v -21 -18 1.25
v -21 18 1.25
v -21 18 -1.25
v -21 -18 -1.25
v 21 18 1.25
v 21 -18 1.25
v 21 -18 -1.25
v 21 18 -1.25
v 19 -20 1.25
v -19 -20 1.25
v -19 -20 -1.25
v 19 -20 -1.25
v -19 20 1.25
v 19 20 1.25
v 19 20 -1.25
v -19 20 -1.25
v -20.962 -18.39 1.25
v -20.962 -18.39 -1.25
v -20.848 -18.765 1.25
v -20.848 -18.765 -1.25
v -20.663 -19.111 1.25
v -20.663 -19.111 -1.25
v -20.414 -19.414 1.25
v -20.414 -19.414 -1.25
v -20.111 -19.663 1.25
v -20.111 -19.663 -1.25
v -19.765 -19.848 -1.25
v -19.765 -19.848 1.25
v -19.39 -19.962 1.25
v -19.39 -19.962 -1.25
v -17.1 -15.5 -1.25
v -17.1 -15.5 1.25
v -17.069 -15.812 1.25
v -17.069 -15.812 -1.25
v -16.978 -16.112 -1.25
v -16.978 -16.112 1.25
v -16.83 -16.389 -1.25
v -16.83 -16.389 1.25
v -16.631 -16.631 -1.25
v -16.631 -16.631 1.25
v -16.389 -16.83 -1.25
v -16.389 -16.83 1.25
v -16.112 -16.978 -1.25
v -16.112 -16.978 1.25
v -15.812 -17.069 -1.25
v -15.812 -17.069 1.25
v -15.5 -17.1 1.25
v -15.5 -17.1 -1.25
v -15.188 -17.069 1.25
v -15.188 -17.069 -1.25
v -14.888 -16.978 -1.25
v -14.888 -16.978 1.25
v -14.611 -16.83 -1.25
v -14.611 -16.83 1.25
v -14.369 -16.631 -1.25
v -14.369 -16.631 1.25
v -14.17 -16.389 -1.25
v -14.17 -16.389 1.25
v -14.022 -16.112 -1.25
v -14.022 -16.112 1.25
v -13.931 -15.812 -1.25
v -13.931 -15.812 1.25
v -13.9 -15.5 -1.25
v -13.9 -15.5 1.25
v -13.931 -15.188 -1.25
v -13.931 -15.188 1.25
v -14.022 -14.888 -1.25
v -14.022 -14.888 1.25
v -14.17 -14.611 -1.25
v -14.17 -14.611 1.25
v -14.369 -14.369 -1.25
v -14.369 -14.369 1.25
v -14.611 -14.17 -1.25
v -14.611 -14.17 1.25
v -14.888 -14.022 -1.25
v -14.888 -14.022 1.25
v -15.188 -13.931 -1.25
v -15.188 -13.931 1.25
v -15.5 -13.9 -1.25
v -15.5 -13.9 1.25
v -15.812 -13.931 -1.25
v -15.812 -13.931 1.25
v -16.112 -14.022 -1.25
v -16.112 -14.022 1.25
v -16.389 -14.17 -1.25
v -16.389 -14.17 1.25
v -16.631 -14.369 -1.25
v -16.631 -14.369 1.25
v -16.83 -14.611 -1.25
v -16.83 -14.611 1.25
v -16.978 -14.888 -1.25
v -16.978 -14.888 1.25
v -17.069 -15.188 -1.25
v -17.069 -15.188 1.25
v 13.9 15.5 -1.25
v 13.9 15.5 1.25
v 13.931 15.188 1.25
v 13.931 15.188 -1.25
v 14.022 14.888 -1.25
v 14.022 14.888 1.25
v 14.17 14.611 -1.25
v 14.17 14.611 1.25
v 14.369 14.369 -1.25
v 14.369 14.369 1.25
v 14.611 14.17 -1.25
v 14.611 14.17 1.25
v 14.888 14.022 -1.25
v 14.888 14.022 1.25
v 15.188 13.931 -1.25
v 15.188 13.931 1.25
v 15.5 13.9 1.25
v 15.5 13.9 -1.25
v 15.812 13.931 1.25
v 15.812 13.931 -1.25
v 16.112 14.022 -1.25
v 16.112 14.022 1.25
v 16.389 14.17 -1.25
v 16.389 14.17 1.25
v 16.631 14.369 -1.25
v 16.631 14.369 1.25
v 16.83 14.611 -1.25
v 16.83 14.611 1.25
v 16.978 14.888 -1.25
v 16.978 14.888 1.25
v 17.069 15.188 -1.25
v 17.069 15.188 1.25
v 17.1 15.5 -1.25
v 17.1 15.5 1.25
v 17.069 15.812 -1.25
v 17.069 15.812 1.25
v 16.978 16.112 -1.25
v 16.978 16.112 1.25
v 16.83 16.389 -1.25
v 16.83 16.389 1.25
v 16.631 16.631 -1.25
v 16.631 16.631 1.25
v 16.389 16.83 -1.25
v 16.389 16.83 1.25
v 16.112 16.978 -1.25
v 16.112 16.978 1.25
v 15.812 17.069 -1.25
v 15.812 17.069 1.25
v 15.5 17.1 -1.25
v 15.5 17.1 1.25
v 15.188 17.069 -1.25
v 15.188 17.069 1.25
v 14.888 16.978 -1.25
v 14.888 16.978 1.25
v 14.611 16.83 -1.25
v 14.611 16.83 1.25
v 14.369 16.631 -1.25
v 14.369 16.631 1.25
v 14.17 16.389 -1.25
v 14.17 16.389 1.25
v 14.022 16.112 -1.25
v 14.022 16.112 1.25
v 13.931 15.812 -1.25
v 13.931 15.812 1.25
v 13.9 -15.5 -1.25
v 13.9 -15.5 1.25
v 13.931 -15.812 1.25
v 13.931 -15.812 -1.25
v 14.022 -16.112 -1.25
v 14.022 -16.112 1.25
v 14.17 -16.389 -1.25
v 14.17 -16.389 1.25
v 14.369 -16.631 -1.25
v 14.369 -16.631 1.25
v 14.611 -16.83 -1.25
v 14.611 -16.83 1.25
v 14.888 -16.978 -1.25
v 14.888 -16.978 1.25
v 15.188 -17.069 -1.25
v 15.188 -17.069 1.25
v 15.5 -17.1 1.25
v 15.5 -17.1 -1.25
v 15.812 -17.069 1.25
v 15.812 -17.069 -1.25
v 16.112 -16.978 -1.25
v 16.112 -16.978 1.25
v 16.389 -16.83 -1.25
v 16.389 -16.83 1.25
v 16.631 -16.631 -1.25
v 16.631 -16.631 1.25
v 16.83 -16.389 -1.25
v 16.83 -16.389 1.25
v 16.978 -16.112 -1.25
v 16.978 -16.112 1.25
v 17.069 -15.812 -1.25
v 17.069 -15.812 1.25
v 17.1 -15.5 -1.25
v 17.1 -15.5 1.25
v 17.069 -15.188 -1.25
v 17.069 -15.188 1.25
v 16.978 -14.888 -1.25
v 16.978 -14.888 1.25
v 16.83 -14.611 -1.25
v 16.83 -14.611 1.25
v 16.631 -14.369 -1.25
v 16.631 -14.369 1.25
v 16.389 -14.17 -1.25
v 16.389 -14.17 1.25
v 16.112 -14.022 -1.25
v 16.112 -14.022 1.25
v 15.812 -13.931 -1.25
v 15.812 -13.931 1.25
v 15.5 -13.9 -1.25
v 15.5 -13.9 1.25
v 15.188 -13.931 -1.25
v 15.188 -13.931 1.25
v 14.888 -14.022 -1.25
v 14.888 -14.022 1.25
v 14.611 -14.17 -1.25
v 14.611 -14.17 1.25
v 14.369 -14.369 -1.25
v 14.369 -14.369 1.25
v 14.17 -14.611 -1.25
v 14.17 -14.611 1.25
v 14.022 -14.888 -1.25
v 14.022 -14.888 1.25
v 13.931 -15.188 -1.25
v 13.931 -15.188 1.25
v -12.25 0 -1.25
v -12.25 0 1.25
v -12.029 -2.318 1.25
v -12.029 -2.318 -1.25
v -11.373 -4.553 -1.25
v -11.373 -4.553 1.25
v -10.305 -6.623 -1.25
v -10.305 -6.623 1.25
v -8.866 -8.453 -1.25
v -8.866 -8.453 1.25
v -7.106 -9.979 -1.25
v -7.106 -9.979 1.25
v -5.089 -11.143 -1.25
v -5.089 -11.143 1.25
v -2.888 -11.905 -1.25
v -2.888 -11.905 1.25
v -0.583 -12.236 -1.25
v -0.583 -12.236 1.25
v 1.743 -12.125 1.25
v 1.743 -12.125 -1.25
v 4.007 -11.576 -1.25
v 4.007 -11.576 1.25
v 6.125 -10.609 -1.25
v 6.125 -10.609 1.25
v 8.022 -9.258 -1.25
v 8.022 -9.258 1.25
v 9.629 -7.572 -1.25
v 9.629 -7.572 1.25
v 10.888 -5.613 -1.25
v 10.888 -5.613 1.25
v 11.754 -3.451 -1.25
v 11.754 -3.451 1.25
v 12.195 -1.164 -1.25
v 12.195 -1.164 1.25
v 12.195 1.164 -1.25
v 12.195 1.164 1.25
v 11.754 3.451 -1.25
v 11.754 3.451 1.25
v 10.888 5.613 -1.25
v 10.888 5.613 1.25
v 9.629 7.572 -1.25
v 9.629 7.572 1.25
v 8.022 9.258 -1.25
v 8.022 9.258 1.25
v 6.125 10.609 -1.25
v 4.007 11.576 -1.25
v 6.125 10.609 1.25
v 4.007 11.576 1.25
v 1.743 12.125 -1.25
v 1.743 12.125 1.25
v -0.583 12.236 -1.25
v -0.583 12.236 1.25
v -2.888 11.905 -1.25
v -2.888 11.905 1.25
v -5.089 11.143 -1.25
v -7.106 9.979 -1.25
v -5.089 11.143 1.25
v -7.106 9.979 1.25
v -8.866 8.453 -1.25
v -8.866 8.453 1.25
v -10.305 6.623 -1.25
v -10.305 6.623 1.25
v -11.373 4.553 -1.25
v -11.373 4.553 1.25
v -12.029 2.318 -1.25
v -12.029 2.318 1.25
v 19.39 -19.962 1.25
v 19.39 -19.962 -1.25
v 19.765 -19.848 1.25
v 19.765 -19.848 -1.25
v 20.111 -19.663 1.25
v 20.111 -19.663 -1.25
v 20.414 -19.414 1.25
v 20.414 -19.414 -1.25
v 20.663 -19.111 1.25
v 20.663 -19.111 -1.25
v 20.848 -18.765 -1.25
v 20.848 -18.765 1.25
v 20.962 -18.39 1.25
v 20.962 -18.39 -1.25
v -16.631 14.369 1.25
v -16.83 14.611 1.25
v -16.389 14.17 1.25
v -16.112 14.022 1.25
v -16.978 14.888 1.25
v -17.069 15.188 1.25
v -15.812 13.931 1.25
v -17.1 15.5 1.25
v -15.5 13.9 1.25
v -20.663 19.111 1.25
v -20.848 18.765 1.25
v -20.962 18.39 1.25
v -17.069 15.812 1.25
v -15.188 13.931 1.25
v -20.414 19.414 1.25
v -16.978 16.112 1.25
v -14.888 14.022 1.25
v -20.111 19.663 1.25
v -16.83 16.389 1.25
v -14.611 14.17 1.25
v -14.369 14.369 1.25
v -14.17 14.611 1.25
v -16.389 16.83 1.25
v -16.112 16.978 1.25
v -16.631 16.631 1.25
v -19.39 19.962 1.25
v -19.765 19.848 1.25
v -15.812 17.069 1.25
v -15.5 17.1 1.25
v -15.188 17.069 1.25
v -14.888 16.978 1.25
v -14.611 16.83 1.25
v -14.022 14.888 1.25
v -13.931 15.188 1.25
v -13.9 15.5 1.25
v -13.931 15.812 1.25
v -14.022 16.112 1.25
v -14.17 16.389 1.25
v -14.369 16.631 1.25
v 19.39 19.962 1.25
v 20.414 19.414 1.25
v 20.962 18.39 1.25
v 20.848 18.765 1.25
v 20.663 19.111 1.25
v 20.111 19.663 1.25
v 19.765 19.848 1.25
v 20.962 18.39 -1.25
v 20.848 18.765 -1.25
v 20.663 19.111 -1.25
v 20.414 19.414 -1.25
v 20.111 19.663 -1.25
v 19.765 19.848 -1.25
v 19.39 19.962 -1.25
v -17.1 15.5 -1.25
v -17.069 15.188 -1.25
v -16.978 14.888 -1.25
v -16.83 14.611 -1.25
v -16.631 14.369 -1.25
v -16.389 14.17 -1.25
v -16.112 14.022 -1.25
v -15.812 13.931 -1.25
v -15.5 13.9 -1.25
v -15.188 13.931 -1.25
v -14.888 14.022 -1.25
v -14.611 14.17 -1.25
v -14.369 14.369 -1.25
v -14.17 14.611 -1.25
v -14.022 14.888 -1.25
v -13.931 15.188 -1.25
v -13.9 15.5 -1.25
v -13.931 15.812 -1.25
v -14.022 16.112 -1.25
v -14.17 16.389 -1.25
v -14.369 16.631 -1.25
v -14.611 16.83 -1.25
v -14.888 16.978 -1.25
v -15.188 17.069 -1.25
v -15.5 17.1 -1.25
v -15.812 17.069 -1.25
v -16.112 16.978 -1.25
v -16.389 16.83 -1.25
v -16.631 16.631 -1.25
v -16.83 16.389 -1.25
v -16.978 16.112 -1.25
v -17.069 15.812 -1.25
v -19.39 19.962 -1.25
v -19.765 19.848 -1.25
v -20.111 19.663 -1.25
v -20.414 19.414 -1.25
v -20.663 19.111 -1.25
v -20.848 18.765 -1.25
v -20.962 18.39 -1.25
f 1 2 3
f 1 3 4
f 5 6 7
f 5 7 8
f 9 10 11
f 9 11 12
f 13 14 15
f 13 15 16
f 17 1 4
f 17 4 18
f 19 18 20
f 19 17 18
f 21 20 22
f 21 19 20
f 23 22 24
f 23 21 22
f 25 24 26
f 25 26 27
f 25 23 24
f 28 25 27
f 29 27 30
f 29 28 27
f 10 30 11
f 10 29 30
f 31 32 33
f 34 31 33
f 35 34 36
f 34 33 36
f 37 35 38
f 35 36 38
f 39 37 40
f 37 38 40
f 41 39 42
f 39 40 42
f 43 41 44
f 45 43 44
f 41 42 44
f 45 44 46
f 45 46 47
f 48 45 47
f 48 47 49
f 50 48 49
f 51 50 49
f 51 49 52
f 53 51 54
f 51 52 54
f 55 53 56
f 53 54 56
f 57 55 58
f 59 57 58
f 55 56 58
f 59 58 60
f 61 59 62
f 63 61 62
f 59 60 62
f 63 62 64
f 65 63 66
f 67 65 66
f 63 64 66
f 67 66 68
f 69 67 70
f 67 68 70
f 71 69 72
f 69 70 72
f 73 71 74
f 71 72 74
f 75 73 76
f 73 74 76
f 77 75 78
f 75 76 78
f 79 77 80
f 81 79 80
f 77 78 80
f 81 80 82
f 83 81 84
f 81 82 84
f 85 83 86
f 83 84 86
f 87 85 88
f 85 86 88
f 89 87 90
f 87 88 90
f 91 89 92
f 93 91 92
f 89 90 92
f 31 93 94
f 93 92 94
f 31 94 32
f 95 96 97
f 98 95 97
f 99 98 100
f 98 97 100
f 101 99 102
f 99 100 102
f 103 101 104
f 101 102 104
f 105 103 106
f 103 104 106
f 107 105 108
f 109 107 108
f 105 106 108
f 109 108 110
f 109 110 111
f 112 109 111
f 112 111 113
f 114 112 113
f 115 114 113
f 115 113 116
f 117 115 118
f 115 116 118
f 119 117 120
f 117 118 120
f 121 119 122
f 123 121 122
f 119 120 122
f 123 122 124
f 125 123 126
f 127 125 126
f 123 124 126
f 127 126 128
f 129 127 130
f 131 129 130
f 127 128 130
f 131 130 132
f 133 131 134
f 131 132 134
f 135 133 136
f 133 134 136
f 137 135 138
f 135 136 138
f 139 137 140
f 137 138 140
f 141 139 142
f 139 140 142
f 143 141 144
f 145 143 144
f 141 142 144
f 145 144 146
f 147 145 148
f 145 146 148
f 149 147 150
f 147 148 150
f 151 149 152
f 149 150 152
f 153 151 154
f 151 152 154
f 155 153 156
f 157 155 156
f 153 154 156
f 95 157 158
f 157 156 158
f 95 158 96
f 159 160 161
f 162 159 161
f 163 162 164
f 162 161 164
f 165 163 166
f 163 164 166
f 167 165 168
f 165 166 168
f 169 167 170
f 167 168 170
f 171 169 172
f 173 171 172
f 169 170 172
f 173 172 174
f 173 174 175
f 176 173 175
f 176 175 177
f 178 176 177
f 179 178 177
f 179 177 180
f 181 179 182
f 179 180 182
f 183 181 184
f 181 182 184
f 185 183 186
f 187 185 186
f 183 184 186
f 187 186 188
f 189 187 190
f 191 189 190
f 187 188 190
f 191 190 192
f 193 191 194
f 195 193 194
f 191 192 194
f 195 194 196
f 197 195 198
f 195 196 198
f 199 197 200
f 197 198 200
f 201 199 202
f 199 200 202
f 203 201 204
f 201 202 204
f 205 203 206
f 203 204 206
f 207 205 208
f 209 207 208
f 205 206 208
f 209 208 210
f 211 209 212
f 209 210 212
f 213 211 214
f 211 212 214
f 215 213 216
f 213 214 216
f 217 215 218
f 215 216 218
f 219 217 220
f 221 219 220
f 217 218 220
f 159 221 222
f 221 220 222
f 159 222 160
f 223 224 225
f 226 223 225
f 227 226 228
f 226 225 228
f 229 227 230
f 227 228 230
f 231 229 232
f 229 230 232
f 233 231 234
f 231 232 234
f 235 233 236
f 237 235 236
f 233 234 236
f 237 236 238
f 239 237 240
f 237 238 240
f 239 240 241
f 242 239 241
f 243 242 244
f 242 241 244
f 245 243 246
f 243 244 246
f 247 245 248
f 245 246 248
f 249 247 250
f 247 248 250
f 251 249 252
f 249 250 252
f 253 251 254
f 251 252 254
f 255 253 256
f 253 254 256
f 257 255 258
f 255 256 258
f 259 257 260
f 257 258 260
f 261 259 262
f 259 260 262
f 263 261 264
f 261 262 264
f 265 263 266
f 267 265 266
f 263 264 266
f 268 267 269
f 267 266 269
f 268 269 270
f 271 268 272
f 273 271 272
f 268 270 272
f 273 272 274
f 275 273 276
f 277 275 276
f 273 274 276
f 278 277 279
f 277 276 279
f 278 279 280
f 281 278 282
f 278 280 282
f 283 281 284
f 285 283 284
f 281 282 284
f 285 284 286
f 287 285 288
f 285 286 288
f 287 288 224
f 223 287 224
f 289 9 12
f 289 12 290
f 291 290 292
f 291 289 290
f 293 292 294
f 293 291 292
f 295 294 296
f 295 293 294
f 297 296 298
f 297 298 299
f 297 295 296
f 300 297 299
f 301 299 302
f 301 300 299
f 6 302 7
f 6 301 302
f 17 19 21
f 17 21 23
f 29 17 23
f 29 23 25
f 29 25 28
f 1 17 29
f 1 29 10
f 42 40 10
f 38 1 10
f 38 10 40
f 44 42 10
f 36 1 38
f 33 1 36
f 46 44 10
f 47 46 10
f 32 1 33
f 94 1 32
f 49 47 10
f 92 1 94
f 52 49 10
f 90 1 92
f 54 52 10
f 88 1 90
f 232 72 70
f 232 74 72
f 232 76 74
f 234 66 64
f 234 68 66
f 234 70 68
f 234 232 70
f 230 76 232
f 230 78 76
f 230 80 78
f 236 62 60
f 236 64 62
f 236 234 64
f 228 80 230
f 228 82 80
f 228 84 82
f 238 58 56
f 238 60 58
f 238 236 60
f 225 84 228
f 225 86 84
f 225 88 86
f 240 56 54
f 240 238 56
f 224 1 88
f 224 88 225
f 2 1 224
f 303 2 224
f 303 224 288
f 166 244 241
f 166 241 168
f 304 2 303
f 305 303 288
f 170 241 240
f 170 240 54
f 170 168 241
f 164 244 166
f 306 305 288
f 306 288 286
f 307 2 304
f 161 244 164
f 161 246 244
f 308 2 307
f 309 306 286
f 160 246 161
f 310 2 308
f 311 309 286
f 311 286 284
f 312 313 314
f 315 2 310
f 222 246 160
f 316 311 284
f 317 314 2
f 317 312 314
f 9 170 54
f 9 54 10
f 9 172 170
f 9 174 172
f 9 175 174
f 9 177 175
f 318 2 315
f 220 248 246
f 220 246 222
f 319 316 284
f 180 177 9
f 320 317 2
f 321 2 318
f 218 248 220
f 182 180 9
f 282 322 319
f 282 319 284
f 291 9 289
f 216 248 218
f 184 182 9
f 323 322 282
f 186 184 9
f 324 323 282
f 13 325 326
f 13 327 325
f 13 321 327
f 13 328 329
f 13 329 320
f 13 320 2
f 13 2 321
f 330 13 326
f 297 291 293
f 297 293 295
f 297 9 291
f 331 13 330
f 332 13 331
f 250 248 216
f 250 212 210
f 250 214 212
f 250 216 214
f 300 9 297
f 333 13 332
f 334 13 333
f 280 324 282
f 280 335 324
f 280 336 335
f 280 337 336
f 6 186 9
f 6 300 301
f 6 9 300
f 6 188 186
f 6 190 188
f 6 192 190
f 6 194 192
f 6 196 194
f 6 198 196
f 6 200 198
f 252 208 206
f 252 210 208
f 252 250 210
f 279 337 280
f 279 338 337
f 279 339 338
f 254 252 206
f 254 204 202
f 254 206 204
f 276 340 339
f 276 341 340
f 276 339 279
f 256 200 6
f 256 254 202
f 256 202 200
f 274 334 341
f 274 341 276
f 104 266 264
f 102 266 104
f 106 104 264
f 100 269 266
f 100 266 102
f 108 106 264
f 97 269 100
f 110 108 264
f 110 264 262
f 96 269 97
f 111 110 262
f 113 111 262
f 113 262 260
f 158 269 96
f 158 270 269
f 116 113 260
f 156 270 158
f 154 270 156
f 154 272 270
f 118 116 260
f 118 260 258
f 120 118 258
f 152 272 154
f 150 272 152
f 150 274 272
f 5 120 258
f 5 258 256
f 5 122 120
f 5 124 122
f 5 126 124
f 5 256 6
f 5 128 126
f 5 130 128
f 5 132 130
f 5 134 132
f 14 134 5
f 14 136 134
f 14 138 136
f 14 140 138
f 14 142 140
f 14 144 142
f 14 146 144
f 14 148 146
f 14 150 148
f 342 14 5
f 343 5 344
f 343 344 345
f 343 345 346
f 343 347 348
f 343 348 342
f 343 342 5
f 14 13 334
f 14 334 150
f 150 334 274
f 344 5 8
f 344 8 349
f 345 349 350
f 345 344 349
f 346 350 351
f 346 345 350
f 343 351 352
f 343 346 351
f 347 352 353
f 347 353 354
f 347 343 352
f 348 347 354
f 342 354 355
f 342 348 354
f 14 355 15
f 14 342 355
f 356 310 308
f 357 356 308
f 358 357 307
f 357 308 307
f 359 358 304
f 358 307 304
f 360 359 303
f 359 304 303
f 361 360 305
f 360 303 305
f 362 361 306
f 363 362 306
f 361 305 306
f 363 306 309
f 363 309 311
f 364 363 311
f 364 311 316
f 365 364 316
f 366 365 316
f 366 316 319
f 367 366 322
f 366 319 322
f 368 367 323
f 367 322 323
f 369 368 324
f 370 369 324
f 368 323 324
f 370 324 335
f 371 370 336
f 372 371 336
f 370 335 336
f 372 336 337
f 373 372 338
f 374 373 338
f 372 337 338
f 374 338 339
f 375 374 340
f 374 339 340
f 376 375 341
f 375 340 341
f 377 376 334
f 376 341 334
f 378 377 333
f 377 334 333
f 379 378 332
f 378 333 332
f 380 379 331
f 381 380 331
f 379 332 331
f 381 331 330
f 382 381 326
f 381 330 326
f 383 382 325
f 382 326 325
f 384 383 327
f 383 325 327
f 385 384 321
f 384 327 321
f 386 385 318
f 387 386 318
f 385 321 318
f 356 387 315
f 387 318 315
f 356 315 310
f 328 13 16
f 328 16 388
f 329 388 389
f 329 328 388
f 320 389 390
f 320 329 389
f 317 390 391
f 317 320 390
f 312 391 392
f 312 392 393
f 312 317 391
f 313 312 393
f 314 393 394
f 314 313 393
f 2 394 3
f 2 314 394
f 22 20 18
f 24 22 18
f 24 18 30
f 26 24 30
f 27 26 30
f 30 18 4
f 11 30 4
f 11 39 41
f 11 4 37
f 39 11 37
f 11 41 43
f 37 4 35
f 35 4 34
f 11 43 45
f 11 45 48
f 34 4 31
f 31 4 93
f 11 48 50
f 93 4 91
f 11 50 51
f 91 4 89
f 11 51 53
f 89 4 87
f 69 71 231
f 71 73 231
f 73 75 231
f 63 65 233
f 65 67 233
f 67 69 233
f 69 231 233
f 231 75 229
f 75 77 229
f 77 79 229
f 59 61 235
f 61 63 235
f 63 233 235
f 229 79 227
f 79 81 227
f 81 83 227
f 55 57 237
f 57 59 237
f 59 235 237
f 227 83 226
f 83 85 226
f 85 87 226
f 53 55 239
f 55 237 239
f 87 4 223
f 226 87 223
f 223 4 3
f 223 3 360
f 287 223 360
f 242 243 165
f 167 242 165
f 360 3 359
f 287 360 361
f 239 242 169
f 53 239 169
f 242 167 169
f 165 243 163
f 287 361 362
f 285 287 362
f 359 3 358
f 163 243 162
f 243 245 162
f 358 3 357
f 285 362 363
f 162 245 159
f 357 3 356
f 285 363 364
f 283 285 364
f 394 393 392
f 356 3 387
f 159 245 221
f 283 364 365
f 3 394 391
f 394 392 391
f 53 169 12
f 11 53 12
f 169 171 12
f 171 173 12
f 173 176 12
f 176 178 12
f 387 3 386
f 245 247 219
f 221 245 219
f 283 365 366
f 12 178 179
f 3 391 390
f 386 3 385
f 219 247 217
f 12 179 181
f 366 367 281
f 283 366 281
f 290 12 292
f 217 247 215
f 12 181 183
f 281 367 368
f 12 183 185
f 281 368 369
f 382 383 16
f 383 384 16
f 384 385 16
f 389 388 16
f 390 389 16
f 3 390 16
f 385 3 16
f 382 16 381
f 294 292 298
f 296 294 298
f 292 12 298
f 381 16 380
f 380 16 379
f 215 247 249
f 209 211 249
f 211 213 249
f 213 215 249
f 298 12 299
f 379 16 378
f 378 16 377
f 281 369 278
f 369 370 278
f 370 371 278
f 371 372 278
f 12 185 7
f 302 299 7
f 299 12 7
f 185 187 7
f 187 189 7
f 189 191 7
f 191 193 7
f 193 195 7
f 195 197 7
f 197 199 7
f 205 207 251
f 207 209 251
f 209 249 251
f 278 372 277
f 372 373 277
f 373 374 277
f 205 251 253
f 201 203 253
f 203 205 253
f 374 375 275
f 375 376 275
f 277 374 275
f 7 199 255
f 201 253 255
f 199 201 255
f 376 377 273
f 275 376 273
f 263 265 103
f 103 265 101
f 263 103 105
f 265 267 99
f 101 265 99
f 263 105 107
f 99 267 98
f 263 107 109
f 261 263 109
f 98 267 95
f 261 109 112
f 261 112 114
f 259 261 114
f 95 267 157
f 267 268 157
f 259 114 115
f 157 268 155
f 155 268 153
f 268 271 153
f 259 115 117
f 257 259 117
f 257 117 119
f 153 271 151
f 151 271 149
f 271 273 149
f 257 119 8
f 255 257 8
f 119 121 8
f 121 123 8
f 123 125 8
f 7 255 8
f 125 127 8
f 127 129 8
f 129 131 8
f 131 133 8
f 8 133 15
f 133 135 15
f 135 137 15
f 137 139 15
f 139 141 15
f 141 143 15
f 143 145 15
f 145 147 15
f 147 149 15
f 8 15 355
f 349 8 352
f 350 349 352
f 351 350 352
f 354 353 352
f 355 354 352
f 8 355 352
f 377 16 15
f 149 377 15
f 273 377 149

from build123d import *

# Parameters (mm, degrees)
SKETCH1_R           = 1.6
SKETCH1_R_2         = 12.25
BOSS_EXTRUDE1_DEPTH = 2.5


with BuildPart() as part:
    # Sketch1 → Boss-Extrude1 (new body)
    with BuildSketch(Plane.XY.offset(1.25)):
        with BuildLine():
            Line((-21, 18), (-21, -18))
            ThreePointArc((-21, -18), (-20.414213562, -19.414213562), (-19, -20))
            Line((-19, -20), (19, -20))
            ThreePointArc((19, -20), (20.414213562, -19.414213562), (21, -18))
            Line((21, -18), (21, 18))
            ThreePointArc((21, 18), (20.414213562, 19.414213562), (19, 20))
            Line((19, 20), (-19, 20))
            ThreePointArc((-19, 20), (-20.414213562, 19.414213562), (-21, 18))
        make_face()
        with Locations(Location((-15.5, 15.5, 0), (0, 0, 180))):
            Circle(SKETCH1_R, mode=Mode.SUBTRACT)
        with Locations(Location((15.5, -15.5, 0), (0, 0, 180))):
            Circle(SKETCH1_R, mode=Mode.SUBTRACT)
        with Locations(Location((0, 0, 0), (0, 0, 180))):
            Circle(SKETCH1_R_2, mode=Mode.SUBTRACT)
        with Locations(Location((-15.5, -15.5, 0), (0, 0, 180))):
            Circle(SKETCH1_R, mode=Mode.SUBTRACT)
        with Locations(Location((15.5, 15.5, 0), (0, 0, 180))):
            Circle(SKETCH1_R, mode=Mode.SUBTRACT)
    extrude(amount=-BOSS_EXTRUDE1_DEPTH)


solid = part.part
